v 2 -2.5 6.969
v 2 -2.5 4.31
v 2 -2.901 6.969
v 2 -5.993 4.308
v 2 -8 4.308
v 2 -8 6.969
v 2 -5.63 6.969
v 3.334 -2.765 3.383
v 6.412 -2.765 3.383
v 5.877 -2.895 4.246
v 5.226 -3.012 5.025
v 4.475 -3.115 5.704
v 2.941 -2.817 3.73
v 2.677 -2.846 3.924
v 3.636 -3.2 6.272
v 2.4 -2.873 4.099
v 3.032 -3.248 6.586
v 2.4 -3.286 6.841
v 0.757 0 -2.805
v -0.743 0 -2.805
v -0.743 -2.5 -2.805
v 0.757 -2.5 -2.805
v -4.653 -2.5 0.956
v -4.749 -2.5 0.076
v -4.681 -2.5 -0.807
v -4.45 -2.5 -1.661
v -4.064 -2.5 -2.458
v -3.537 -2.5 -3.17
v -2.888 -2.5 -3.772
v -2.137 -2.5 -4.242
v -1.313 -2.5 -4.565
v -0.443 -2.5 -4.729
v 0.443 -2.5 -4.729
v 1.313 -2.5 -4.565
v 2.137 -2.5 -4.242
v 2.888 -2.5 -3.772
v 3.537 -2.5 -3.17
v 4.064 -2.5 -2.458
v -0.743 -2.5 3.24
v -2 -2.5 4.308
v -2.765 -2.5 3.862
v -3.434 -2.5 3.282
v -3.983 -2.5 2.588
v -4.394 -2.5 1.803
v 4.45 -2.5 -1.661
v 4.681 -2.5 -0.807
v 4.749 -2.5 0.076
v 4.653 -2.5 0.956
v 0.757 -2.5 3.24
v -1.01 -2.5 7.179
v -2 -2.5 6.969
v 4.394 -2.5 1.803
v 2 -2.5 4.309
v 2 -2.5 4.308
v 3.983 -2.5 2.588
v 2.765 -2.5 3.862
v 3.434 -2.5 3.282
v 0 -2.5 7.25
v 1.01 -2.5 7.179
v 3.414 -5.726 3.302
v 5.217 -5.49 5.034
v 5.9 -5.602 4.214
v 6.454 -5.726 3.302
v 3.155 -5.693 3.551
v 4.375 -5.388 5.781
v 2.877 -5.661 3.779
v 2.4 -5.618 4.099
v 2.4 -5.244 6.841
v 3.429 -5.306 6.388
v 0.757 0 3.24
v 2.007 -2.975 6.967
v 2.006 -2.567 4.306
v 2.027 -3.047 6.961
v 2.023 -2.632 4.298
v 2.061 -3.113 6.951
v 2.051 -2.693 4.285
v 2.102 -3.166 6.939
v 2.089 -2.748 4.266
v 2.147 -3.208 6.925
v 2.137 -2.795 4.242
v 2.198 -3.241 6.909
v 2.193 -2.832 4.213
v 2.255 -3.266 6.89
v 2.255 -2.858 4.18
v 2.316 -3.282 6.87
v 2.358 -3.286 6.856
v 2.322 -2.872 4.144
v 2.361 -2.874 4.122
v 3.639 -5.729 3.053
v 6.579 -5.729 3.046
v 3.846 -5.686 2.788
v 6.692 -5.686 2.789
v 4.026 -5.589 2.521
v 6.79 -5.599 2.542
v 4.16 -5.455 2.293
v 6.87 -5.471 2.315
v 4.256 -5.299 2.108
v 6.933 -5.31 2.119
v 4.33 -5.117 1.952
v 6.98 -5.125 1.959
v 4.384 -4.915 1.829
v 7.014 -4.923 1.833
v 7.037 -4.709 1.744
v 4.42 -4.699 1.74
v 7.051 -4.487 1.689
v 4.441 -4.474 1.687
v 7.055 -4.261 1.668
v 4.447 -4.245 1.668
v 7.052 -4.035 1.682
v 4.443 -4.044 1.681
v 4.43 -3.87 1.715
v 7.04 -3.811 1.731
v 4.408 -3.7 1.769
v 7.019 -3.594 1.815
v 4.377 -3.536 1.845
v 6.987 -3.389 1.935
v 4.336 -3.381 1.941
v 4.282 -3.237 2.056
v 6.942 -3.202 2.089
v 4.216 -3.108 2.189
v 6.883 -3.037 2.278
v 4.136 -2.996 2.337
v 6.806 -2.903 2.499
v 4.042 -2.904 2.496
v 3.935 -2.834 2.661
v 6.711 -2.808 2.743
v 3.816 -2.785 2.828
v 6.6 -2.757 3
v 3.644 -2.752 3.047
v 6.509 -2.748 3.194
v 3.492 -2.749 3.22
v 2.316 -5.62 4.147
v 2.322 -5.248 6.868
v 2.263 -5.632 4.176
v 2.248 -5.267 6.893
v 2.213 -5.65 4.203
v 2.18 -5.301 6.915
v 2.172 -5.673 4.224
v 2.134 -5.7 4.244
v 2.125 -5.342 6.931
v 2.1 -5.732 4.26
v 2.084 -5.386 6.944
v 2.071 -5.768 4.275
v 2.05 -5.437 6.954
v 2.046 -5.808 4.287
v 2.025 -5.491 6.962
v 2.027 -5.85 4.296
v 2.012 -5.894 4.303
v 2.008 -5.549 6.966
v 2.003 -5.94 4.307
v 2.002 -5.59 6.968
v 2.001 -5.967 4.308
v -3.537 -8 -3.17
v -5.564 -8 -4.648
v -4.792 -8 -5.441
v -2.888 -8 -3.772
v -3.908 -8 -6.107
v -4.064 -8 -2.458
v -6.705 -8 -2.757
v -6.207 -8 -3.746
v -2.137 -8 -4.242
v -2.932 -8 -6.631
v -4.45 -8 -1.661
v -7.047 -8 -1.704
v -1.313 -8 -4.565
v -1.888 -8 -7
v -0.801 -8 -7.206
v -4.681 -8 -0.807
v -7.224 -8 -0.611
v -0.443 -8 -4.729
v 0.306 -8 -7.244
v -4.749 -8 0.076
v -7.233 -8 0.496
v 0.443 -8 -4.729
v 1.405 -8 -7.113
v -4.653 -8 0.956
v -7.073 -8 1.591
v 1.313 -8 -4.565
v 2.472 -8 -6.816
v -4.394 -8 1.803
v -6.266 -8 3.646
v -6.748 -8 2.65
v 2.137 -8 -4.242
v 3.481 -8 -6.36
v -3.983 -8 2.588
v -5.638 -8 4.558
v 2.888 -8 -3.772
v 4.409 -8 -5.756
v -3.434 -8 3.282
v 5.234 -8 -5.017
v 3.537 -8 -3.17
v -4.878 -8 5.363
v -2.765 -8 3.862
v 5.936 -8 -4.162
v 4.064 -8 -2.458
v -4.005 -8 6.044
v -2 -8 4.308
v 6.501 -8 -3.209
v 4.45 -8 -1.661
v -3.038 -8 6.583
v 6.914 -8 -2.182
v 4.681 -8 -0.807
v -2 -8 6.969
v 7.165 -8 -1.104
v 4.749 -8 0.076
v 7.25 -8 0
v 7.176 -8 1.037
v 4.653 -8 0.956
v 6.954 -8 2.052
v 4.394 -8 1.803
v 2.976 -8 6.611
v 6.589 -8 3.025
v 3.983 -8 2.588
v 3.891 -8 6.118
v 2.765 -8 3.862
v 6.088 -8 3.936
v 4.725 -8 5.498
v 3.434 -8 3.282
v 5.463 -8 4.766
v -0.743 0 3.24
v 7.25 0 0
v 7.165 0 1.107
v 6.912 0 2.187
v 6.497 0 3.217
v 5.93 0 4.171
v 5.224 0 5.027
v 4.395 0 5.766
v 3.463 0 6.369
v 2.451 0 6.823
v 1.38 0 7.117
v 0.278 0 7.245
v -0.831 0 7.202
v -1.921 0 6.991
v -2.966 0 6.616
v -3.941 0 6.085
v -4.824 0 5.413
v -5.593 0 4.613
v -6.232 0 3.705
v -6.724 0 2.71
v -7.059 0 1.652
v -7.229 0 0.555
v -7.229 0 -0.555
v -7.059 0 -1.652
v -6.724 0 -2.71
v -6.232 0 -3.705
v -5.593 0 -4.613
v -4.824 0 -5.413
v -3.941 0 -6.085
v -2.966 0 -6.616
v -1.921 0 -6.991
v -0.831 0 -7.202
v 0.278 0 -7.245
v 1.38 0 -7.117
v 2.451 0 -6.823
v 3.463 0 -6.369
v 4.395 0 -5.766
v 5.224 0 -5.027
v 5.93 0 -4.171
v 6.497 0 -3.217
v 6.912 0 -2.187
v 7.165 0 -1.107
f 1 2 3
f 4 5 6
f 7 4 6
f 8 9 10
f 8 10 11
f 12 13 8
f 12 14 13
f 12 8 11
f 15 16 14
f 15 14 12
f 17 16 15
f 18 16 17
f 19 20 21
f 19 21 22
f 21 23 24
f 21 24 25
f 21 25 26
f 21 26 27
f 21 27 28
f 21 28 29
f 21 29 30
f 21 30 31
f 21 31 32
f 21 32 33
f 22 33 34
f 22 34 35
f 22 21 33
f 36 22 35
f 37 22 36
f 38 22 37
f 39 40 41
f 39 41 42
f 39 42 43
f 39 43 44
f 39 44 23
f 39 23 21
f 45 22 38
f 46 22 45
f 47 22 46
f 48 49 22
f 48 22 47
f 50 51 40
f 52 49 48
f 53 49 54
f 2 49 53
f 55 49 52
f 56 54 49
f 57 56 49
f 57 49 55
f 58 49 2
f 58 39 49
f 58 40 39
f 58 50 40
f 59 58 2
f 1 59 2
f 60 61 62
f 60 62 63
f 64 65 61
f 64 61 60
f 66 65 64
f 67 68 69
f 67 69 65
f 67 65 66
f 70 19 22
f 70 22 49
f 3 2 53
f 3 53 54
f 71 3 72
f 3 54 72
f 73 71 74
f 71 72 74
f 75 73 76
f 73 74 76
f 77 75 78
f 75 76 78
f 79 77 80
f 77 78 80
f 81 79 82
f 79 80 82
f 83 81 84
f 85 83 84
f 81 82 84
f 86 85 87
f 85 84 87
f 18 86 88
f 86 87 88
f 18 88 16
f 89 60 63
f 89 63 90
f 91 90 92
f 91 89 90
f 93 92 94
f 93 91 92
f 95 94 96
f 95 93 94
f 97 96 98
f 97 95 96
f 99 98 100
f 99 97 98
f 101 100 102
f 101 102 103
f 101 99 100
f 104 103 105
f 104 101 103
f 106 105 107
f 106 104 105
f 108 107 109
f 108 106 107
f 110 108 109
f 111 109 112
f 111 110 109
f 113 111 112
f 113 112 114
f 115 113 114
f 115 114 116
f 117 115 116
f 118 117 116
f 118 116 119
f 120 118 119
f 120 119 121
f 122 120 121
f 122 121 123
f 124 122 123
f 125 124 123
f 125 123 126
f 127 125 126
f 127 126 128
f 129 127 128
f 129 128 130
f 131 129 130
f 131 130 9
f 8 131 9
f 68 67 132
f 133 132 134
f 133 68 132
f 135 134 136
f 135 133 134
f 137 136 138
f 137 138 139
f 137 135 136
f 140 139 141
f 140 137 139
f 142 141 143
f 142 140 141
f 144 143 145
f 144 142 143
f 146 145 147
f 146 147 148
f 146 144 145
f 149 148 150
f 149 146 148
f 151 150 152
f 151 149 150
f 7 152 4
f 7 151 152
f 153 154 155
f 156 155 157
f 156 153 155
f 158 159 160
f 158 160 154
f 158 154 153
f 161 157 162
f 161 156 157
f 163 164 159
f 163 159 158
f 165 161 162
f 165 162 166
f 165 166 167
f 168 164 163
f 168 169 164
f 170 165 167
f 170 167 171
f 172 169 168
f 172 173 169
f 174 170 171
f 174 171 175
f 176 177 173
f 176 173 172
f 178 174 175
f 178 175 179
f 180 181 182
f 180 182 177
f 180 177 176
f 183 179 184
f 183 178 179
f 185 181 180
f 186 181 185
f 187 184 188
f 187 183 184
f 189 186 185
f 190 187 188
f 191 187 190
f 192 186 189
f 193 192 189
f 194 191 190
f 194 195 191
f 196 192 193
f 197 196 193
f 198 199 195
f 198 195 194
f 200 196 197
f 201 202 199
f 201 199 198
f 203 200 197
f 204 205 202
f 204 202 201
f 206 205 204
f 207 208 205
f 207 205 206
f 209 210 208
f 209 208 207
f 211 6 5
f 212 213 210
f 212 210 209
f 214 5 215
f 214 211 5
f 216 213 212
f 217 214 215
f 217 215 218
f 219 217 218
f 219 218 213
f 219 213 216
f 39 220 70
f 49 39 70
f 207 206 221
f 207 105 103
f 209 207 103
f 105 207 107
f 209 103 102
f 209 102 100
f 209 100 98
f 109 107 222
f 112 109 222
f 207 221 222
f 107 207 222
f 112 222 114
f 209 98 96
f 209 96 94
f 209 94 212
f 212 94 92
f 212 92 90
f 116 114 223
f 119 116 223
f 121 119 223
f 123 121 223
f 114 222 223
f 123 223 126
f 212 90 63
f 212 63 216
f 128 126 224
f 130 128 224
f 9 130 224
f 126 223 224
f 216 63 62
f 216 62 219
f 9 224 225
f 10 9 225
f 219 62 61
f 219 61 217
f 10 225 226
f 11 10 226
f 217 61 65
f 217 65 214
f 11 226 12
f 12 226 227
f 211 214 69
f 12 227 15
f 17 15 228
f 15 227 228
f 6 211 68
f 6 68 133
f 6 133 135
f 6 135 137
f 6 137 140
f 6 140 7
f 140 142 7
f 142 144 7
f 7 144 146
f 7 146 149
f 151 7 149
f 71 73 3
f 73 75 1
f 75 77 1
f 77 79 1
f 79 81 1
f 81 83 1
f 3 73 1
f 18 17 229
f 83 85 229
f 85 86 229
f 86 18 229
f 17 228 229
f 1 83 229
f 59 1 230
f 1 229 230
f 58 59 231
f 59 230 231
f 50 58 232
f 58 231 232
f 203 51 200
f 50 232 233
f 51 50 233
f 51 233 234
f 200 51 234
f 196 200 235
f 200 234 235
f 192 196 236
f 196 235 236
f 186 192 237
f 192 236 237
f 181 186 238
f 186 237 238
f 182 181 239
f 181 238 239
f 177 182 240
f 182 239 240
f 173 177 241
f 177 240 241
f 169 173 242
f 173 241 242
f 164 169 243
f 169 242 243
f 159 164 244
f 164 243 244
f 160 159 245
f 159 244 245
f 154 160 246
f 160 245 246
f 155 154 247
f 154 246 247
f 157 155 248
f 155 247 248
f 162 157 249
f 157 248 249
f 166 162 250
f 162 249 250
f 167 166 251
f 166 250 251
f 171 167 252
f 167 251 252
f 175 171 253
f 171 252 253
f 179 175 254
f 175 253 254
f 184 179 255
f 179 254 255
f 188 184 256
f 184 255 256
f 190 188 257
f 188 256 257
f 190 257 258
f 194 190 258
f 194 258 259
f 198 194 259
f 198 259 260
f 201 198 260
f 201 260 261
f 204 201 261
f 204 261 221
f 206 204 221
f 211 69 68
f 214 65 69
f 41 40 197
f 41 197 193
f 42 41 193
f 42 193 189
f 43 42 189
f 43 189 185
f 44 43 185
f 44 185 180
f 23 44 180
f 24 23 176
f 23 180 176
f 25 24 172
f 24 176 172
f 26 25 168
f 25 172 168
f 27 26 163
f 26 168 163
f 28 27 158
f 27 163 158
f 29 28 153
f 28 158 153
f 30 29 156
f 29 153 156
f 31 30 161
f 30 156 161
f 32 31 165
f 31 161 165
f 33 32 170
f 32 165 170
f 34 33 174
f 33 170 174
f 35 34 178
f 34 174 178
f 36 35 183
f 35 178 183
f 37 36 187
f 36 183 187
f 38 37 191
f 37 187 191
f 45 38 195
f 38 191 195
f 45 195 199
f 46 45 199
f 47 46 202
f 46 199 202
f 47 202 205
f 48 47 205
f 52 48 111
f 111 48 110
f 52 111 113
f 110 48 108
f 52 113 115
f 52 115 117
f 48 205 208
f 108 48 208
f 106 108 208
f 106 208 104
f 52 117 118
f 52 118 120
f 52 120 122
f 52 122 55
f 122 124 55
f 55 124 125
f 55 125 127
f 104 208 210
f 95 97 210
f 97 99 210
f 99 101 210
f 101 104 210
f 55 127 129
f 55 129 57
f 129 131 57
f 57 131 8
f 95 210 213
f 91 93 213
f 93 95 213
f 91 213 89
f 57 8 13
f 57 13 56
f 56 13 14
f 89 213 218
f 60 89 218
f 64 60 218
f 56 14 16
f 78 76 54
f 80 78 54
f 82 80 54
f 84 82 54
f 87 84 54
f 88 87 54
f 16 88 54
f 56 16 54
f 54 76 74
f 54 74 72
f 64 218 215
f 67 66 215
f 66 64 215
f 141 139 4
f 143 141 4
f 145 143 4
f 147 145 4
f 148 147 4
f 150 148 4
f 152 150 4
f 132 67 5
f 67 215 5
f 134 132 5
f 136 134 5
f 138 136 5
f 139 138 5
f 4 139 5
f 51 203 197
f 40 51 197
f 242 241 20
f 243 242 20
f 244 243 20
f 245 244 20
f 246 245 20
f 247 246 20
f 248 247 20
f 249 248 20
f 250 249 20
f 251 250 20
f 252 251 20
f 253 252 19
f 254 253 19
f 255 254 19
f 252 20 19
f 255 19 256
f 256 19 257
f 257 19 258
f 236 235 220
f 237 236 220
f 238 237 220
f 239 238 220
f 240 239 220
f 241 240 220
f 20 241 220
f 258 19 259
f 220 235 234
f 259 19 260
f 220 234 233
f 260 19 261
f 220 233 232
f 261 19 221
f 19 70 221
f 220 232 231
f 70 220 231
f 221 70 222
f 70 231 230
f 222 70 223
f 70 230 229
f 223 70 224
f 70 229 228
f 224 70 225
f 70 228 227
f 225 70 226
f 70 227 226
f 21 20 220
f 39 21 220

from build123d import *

# Parameters (mm, degrees)
F0_R     = 7.25
F1_DEPTH = 8
F2_R     = 4.75
F3_DEPTH = 5.5
F4_W     = 4
F4_H     = 9.4417827204
F5_DEPTH = 5.5
F7_DEPTH = 7.251
F8_W     = 1.5
F8_H     = 6.0454548055
F9_DEPTH = 25
F10_R    = 0.4


with BuildPart() as f1:
    # F0 (on Front) → F1 (new body)
    with BuildSketch(Plane.XZ):
        Circle(F0_R)
    extrude(amount=F1_DEPTH)

    # F2 (on face) → F3 (cut)
    with BuildSketch(Plane.XZ.offset(8)):
        Circle(F2_R)
    extrude(amount=-F3_DEPTH, mode=Mode.SUBTRACT)

    # F4 (on face) → F5 (cut, through all)
    with BuildSketch(Plane.XZ.offset(8)):
        with BuildLine():
            Line((-2, 9.4417827204), (-2, 6.9686799324))
            ThreePointArc((-2, 6.9686799324), (0, 7.25), (2, 6.9686799324))
            Line((2, 6.9686799324), (2, 9.4417827204))
            Line((2, 9.4417827204), (-2, 9.4417827204))
        make_face()
        with Locations((0, 4.7208913602)):
            Rectangle(F4_W, F4_H)
    extrude(amount=-F5_DEPTH, mode=Mode.SUBTRACT)

    # F6 (on Right) → F7 (cut, through all)
    with BuildSketch(Plane.YZ):
        with BuildLine():
            Line((-5.0896294415, 7.9721454531), (-5.7264296338, 3.302275436))
            ThreePointArc((-5.7264296338, 3.302275436), (-4.1996874086, 1.6687326956), (-2.7646700478, 3.3834130977))
            Line((-2.7646700478, 3.3834130977), (-3.4622503445, 8.0075236037))
            Line((-3.4622503445, 8.0075236037), (-5.0896294415, 7.9721454531))
        make_face()
    extrude(amount=F7_DEPTH, mode=Mode.SUBTRACT)

    # F8 (on face) → F9 (cut)
    with BuildSketch(Plane.XZ):
        with Locations((0.0068399386, 0.2177511924)):
            Rectangle(F8_W, F8_H)
    extrude(amount=F9_DEPTH, mode=Mode.SUBTRACT)

    # F10
    f10_edges = [f1.edges().sort_by_distance(p)[0] for p in [
        (2, -3.104874, 5.638551),
        (2, -5.407847, 5.638551),
    ]]
    fillet(f10_edges, radius=F10_R)


solid = f1.part
